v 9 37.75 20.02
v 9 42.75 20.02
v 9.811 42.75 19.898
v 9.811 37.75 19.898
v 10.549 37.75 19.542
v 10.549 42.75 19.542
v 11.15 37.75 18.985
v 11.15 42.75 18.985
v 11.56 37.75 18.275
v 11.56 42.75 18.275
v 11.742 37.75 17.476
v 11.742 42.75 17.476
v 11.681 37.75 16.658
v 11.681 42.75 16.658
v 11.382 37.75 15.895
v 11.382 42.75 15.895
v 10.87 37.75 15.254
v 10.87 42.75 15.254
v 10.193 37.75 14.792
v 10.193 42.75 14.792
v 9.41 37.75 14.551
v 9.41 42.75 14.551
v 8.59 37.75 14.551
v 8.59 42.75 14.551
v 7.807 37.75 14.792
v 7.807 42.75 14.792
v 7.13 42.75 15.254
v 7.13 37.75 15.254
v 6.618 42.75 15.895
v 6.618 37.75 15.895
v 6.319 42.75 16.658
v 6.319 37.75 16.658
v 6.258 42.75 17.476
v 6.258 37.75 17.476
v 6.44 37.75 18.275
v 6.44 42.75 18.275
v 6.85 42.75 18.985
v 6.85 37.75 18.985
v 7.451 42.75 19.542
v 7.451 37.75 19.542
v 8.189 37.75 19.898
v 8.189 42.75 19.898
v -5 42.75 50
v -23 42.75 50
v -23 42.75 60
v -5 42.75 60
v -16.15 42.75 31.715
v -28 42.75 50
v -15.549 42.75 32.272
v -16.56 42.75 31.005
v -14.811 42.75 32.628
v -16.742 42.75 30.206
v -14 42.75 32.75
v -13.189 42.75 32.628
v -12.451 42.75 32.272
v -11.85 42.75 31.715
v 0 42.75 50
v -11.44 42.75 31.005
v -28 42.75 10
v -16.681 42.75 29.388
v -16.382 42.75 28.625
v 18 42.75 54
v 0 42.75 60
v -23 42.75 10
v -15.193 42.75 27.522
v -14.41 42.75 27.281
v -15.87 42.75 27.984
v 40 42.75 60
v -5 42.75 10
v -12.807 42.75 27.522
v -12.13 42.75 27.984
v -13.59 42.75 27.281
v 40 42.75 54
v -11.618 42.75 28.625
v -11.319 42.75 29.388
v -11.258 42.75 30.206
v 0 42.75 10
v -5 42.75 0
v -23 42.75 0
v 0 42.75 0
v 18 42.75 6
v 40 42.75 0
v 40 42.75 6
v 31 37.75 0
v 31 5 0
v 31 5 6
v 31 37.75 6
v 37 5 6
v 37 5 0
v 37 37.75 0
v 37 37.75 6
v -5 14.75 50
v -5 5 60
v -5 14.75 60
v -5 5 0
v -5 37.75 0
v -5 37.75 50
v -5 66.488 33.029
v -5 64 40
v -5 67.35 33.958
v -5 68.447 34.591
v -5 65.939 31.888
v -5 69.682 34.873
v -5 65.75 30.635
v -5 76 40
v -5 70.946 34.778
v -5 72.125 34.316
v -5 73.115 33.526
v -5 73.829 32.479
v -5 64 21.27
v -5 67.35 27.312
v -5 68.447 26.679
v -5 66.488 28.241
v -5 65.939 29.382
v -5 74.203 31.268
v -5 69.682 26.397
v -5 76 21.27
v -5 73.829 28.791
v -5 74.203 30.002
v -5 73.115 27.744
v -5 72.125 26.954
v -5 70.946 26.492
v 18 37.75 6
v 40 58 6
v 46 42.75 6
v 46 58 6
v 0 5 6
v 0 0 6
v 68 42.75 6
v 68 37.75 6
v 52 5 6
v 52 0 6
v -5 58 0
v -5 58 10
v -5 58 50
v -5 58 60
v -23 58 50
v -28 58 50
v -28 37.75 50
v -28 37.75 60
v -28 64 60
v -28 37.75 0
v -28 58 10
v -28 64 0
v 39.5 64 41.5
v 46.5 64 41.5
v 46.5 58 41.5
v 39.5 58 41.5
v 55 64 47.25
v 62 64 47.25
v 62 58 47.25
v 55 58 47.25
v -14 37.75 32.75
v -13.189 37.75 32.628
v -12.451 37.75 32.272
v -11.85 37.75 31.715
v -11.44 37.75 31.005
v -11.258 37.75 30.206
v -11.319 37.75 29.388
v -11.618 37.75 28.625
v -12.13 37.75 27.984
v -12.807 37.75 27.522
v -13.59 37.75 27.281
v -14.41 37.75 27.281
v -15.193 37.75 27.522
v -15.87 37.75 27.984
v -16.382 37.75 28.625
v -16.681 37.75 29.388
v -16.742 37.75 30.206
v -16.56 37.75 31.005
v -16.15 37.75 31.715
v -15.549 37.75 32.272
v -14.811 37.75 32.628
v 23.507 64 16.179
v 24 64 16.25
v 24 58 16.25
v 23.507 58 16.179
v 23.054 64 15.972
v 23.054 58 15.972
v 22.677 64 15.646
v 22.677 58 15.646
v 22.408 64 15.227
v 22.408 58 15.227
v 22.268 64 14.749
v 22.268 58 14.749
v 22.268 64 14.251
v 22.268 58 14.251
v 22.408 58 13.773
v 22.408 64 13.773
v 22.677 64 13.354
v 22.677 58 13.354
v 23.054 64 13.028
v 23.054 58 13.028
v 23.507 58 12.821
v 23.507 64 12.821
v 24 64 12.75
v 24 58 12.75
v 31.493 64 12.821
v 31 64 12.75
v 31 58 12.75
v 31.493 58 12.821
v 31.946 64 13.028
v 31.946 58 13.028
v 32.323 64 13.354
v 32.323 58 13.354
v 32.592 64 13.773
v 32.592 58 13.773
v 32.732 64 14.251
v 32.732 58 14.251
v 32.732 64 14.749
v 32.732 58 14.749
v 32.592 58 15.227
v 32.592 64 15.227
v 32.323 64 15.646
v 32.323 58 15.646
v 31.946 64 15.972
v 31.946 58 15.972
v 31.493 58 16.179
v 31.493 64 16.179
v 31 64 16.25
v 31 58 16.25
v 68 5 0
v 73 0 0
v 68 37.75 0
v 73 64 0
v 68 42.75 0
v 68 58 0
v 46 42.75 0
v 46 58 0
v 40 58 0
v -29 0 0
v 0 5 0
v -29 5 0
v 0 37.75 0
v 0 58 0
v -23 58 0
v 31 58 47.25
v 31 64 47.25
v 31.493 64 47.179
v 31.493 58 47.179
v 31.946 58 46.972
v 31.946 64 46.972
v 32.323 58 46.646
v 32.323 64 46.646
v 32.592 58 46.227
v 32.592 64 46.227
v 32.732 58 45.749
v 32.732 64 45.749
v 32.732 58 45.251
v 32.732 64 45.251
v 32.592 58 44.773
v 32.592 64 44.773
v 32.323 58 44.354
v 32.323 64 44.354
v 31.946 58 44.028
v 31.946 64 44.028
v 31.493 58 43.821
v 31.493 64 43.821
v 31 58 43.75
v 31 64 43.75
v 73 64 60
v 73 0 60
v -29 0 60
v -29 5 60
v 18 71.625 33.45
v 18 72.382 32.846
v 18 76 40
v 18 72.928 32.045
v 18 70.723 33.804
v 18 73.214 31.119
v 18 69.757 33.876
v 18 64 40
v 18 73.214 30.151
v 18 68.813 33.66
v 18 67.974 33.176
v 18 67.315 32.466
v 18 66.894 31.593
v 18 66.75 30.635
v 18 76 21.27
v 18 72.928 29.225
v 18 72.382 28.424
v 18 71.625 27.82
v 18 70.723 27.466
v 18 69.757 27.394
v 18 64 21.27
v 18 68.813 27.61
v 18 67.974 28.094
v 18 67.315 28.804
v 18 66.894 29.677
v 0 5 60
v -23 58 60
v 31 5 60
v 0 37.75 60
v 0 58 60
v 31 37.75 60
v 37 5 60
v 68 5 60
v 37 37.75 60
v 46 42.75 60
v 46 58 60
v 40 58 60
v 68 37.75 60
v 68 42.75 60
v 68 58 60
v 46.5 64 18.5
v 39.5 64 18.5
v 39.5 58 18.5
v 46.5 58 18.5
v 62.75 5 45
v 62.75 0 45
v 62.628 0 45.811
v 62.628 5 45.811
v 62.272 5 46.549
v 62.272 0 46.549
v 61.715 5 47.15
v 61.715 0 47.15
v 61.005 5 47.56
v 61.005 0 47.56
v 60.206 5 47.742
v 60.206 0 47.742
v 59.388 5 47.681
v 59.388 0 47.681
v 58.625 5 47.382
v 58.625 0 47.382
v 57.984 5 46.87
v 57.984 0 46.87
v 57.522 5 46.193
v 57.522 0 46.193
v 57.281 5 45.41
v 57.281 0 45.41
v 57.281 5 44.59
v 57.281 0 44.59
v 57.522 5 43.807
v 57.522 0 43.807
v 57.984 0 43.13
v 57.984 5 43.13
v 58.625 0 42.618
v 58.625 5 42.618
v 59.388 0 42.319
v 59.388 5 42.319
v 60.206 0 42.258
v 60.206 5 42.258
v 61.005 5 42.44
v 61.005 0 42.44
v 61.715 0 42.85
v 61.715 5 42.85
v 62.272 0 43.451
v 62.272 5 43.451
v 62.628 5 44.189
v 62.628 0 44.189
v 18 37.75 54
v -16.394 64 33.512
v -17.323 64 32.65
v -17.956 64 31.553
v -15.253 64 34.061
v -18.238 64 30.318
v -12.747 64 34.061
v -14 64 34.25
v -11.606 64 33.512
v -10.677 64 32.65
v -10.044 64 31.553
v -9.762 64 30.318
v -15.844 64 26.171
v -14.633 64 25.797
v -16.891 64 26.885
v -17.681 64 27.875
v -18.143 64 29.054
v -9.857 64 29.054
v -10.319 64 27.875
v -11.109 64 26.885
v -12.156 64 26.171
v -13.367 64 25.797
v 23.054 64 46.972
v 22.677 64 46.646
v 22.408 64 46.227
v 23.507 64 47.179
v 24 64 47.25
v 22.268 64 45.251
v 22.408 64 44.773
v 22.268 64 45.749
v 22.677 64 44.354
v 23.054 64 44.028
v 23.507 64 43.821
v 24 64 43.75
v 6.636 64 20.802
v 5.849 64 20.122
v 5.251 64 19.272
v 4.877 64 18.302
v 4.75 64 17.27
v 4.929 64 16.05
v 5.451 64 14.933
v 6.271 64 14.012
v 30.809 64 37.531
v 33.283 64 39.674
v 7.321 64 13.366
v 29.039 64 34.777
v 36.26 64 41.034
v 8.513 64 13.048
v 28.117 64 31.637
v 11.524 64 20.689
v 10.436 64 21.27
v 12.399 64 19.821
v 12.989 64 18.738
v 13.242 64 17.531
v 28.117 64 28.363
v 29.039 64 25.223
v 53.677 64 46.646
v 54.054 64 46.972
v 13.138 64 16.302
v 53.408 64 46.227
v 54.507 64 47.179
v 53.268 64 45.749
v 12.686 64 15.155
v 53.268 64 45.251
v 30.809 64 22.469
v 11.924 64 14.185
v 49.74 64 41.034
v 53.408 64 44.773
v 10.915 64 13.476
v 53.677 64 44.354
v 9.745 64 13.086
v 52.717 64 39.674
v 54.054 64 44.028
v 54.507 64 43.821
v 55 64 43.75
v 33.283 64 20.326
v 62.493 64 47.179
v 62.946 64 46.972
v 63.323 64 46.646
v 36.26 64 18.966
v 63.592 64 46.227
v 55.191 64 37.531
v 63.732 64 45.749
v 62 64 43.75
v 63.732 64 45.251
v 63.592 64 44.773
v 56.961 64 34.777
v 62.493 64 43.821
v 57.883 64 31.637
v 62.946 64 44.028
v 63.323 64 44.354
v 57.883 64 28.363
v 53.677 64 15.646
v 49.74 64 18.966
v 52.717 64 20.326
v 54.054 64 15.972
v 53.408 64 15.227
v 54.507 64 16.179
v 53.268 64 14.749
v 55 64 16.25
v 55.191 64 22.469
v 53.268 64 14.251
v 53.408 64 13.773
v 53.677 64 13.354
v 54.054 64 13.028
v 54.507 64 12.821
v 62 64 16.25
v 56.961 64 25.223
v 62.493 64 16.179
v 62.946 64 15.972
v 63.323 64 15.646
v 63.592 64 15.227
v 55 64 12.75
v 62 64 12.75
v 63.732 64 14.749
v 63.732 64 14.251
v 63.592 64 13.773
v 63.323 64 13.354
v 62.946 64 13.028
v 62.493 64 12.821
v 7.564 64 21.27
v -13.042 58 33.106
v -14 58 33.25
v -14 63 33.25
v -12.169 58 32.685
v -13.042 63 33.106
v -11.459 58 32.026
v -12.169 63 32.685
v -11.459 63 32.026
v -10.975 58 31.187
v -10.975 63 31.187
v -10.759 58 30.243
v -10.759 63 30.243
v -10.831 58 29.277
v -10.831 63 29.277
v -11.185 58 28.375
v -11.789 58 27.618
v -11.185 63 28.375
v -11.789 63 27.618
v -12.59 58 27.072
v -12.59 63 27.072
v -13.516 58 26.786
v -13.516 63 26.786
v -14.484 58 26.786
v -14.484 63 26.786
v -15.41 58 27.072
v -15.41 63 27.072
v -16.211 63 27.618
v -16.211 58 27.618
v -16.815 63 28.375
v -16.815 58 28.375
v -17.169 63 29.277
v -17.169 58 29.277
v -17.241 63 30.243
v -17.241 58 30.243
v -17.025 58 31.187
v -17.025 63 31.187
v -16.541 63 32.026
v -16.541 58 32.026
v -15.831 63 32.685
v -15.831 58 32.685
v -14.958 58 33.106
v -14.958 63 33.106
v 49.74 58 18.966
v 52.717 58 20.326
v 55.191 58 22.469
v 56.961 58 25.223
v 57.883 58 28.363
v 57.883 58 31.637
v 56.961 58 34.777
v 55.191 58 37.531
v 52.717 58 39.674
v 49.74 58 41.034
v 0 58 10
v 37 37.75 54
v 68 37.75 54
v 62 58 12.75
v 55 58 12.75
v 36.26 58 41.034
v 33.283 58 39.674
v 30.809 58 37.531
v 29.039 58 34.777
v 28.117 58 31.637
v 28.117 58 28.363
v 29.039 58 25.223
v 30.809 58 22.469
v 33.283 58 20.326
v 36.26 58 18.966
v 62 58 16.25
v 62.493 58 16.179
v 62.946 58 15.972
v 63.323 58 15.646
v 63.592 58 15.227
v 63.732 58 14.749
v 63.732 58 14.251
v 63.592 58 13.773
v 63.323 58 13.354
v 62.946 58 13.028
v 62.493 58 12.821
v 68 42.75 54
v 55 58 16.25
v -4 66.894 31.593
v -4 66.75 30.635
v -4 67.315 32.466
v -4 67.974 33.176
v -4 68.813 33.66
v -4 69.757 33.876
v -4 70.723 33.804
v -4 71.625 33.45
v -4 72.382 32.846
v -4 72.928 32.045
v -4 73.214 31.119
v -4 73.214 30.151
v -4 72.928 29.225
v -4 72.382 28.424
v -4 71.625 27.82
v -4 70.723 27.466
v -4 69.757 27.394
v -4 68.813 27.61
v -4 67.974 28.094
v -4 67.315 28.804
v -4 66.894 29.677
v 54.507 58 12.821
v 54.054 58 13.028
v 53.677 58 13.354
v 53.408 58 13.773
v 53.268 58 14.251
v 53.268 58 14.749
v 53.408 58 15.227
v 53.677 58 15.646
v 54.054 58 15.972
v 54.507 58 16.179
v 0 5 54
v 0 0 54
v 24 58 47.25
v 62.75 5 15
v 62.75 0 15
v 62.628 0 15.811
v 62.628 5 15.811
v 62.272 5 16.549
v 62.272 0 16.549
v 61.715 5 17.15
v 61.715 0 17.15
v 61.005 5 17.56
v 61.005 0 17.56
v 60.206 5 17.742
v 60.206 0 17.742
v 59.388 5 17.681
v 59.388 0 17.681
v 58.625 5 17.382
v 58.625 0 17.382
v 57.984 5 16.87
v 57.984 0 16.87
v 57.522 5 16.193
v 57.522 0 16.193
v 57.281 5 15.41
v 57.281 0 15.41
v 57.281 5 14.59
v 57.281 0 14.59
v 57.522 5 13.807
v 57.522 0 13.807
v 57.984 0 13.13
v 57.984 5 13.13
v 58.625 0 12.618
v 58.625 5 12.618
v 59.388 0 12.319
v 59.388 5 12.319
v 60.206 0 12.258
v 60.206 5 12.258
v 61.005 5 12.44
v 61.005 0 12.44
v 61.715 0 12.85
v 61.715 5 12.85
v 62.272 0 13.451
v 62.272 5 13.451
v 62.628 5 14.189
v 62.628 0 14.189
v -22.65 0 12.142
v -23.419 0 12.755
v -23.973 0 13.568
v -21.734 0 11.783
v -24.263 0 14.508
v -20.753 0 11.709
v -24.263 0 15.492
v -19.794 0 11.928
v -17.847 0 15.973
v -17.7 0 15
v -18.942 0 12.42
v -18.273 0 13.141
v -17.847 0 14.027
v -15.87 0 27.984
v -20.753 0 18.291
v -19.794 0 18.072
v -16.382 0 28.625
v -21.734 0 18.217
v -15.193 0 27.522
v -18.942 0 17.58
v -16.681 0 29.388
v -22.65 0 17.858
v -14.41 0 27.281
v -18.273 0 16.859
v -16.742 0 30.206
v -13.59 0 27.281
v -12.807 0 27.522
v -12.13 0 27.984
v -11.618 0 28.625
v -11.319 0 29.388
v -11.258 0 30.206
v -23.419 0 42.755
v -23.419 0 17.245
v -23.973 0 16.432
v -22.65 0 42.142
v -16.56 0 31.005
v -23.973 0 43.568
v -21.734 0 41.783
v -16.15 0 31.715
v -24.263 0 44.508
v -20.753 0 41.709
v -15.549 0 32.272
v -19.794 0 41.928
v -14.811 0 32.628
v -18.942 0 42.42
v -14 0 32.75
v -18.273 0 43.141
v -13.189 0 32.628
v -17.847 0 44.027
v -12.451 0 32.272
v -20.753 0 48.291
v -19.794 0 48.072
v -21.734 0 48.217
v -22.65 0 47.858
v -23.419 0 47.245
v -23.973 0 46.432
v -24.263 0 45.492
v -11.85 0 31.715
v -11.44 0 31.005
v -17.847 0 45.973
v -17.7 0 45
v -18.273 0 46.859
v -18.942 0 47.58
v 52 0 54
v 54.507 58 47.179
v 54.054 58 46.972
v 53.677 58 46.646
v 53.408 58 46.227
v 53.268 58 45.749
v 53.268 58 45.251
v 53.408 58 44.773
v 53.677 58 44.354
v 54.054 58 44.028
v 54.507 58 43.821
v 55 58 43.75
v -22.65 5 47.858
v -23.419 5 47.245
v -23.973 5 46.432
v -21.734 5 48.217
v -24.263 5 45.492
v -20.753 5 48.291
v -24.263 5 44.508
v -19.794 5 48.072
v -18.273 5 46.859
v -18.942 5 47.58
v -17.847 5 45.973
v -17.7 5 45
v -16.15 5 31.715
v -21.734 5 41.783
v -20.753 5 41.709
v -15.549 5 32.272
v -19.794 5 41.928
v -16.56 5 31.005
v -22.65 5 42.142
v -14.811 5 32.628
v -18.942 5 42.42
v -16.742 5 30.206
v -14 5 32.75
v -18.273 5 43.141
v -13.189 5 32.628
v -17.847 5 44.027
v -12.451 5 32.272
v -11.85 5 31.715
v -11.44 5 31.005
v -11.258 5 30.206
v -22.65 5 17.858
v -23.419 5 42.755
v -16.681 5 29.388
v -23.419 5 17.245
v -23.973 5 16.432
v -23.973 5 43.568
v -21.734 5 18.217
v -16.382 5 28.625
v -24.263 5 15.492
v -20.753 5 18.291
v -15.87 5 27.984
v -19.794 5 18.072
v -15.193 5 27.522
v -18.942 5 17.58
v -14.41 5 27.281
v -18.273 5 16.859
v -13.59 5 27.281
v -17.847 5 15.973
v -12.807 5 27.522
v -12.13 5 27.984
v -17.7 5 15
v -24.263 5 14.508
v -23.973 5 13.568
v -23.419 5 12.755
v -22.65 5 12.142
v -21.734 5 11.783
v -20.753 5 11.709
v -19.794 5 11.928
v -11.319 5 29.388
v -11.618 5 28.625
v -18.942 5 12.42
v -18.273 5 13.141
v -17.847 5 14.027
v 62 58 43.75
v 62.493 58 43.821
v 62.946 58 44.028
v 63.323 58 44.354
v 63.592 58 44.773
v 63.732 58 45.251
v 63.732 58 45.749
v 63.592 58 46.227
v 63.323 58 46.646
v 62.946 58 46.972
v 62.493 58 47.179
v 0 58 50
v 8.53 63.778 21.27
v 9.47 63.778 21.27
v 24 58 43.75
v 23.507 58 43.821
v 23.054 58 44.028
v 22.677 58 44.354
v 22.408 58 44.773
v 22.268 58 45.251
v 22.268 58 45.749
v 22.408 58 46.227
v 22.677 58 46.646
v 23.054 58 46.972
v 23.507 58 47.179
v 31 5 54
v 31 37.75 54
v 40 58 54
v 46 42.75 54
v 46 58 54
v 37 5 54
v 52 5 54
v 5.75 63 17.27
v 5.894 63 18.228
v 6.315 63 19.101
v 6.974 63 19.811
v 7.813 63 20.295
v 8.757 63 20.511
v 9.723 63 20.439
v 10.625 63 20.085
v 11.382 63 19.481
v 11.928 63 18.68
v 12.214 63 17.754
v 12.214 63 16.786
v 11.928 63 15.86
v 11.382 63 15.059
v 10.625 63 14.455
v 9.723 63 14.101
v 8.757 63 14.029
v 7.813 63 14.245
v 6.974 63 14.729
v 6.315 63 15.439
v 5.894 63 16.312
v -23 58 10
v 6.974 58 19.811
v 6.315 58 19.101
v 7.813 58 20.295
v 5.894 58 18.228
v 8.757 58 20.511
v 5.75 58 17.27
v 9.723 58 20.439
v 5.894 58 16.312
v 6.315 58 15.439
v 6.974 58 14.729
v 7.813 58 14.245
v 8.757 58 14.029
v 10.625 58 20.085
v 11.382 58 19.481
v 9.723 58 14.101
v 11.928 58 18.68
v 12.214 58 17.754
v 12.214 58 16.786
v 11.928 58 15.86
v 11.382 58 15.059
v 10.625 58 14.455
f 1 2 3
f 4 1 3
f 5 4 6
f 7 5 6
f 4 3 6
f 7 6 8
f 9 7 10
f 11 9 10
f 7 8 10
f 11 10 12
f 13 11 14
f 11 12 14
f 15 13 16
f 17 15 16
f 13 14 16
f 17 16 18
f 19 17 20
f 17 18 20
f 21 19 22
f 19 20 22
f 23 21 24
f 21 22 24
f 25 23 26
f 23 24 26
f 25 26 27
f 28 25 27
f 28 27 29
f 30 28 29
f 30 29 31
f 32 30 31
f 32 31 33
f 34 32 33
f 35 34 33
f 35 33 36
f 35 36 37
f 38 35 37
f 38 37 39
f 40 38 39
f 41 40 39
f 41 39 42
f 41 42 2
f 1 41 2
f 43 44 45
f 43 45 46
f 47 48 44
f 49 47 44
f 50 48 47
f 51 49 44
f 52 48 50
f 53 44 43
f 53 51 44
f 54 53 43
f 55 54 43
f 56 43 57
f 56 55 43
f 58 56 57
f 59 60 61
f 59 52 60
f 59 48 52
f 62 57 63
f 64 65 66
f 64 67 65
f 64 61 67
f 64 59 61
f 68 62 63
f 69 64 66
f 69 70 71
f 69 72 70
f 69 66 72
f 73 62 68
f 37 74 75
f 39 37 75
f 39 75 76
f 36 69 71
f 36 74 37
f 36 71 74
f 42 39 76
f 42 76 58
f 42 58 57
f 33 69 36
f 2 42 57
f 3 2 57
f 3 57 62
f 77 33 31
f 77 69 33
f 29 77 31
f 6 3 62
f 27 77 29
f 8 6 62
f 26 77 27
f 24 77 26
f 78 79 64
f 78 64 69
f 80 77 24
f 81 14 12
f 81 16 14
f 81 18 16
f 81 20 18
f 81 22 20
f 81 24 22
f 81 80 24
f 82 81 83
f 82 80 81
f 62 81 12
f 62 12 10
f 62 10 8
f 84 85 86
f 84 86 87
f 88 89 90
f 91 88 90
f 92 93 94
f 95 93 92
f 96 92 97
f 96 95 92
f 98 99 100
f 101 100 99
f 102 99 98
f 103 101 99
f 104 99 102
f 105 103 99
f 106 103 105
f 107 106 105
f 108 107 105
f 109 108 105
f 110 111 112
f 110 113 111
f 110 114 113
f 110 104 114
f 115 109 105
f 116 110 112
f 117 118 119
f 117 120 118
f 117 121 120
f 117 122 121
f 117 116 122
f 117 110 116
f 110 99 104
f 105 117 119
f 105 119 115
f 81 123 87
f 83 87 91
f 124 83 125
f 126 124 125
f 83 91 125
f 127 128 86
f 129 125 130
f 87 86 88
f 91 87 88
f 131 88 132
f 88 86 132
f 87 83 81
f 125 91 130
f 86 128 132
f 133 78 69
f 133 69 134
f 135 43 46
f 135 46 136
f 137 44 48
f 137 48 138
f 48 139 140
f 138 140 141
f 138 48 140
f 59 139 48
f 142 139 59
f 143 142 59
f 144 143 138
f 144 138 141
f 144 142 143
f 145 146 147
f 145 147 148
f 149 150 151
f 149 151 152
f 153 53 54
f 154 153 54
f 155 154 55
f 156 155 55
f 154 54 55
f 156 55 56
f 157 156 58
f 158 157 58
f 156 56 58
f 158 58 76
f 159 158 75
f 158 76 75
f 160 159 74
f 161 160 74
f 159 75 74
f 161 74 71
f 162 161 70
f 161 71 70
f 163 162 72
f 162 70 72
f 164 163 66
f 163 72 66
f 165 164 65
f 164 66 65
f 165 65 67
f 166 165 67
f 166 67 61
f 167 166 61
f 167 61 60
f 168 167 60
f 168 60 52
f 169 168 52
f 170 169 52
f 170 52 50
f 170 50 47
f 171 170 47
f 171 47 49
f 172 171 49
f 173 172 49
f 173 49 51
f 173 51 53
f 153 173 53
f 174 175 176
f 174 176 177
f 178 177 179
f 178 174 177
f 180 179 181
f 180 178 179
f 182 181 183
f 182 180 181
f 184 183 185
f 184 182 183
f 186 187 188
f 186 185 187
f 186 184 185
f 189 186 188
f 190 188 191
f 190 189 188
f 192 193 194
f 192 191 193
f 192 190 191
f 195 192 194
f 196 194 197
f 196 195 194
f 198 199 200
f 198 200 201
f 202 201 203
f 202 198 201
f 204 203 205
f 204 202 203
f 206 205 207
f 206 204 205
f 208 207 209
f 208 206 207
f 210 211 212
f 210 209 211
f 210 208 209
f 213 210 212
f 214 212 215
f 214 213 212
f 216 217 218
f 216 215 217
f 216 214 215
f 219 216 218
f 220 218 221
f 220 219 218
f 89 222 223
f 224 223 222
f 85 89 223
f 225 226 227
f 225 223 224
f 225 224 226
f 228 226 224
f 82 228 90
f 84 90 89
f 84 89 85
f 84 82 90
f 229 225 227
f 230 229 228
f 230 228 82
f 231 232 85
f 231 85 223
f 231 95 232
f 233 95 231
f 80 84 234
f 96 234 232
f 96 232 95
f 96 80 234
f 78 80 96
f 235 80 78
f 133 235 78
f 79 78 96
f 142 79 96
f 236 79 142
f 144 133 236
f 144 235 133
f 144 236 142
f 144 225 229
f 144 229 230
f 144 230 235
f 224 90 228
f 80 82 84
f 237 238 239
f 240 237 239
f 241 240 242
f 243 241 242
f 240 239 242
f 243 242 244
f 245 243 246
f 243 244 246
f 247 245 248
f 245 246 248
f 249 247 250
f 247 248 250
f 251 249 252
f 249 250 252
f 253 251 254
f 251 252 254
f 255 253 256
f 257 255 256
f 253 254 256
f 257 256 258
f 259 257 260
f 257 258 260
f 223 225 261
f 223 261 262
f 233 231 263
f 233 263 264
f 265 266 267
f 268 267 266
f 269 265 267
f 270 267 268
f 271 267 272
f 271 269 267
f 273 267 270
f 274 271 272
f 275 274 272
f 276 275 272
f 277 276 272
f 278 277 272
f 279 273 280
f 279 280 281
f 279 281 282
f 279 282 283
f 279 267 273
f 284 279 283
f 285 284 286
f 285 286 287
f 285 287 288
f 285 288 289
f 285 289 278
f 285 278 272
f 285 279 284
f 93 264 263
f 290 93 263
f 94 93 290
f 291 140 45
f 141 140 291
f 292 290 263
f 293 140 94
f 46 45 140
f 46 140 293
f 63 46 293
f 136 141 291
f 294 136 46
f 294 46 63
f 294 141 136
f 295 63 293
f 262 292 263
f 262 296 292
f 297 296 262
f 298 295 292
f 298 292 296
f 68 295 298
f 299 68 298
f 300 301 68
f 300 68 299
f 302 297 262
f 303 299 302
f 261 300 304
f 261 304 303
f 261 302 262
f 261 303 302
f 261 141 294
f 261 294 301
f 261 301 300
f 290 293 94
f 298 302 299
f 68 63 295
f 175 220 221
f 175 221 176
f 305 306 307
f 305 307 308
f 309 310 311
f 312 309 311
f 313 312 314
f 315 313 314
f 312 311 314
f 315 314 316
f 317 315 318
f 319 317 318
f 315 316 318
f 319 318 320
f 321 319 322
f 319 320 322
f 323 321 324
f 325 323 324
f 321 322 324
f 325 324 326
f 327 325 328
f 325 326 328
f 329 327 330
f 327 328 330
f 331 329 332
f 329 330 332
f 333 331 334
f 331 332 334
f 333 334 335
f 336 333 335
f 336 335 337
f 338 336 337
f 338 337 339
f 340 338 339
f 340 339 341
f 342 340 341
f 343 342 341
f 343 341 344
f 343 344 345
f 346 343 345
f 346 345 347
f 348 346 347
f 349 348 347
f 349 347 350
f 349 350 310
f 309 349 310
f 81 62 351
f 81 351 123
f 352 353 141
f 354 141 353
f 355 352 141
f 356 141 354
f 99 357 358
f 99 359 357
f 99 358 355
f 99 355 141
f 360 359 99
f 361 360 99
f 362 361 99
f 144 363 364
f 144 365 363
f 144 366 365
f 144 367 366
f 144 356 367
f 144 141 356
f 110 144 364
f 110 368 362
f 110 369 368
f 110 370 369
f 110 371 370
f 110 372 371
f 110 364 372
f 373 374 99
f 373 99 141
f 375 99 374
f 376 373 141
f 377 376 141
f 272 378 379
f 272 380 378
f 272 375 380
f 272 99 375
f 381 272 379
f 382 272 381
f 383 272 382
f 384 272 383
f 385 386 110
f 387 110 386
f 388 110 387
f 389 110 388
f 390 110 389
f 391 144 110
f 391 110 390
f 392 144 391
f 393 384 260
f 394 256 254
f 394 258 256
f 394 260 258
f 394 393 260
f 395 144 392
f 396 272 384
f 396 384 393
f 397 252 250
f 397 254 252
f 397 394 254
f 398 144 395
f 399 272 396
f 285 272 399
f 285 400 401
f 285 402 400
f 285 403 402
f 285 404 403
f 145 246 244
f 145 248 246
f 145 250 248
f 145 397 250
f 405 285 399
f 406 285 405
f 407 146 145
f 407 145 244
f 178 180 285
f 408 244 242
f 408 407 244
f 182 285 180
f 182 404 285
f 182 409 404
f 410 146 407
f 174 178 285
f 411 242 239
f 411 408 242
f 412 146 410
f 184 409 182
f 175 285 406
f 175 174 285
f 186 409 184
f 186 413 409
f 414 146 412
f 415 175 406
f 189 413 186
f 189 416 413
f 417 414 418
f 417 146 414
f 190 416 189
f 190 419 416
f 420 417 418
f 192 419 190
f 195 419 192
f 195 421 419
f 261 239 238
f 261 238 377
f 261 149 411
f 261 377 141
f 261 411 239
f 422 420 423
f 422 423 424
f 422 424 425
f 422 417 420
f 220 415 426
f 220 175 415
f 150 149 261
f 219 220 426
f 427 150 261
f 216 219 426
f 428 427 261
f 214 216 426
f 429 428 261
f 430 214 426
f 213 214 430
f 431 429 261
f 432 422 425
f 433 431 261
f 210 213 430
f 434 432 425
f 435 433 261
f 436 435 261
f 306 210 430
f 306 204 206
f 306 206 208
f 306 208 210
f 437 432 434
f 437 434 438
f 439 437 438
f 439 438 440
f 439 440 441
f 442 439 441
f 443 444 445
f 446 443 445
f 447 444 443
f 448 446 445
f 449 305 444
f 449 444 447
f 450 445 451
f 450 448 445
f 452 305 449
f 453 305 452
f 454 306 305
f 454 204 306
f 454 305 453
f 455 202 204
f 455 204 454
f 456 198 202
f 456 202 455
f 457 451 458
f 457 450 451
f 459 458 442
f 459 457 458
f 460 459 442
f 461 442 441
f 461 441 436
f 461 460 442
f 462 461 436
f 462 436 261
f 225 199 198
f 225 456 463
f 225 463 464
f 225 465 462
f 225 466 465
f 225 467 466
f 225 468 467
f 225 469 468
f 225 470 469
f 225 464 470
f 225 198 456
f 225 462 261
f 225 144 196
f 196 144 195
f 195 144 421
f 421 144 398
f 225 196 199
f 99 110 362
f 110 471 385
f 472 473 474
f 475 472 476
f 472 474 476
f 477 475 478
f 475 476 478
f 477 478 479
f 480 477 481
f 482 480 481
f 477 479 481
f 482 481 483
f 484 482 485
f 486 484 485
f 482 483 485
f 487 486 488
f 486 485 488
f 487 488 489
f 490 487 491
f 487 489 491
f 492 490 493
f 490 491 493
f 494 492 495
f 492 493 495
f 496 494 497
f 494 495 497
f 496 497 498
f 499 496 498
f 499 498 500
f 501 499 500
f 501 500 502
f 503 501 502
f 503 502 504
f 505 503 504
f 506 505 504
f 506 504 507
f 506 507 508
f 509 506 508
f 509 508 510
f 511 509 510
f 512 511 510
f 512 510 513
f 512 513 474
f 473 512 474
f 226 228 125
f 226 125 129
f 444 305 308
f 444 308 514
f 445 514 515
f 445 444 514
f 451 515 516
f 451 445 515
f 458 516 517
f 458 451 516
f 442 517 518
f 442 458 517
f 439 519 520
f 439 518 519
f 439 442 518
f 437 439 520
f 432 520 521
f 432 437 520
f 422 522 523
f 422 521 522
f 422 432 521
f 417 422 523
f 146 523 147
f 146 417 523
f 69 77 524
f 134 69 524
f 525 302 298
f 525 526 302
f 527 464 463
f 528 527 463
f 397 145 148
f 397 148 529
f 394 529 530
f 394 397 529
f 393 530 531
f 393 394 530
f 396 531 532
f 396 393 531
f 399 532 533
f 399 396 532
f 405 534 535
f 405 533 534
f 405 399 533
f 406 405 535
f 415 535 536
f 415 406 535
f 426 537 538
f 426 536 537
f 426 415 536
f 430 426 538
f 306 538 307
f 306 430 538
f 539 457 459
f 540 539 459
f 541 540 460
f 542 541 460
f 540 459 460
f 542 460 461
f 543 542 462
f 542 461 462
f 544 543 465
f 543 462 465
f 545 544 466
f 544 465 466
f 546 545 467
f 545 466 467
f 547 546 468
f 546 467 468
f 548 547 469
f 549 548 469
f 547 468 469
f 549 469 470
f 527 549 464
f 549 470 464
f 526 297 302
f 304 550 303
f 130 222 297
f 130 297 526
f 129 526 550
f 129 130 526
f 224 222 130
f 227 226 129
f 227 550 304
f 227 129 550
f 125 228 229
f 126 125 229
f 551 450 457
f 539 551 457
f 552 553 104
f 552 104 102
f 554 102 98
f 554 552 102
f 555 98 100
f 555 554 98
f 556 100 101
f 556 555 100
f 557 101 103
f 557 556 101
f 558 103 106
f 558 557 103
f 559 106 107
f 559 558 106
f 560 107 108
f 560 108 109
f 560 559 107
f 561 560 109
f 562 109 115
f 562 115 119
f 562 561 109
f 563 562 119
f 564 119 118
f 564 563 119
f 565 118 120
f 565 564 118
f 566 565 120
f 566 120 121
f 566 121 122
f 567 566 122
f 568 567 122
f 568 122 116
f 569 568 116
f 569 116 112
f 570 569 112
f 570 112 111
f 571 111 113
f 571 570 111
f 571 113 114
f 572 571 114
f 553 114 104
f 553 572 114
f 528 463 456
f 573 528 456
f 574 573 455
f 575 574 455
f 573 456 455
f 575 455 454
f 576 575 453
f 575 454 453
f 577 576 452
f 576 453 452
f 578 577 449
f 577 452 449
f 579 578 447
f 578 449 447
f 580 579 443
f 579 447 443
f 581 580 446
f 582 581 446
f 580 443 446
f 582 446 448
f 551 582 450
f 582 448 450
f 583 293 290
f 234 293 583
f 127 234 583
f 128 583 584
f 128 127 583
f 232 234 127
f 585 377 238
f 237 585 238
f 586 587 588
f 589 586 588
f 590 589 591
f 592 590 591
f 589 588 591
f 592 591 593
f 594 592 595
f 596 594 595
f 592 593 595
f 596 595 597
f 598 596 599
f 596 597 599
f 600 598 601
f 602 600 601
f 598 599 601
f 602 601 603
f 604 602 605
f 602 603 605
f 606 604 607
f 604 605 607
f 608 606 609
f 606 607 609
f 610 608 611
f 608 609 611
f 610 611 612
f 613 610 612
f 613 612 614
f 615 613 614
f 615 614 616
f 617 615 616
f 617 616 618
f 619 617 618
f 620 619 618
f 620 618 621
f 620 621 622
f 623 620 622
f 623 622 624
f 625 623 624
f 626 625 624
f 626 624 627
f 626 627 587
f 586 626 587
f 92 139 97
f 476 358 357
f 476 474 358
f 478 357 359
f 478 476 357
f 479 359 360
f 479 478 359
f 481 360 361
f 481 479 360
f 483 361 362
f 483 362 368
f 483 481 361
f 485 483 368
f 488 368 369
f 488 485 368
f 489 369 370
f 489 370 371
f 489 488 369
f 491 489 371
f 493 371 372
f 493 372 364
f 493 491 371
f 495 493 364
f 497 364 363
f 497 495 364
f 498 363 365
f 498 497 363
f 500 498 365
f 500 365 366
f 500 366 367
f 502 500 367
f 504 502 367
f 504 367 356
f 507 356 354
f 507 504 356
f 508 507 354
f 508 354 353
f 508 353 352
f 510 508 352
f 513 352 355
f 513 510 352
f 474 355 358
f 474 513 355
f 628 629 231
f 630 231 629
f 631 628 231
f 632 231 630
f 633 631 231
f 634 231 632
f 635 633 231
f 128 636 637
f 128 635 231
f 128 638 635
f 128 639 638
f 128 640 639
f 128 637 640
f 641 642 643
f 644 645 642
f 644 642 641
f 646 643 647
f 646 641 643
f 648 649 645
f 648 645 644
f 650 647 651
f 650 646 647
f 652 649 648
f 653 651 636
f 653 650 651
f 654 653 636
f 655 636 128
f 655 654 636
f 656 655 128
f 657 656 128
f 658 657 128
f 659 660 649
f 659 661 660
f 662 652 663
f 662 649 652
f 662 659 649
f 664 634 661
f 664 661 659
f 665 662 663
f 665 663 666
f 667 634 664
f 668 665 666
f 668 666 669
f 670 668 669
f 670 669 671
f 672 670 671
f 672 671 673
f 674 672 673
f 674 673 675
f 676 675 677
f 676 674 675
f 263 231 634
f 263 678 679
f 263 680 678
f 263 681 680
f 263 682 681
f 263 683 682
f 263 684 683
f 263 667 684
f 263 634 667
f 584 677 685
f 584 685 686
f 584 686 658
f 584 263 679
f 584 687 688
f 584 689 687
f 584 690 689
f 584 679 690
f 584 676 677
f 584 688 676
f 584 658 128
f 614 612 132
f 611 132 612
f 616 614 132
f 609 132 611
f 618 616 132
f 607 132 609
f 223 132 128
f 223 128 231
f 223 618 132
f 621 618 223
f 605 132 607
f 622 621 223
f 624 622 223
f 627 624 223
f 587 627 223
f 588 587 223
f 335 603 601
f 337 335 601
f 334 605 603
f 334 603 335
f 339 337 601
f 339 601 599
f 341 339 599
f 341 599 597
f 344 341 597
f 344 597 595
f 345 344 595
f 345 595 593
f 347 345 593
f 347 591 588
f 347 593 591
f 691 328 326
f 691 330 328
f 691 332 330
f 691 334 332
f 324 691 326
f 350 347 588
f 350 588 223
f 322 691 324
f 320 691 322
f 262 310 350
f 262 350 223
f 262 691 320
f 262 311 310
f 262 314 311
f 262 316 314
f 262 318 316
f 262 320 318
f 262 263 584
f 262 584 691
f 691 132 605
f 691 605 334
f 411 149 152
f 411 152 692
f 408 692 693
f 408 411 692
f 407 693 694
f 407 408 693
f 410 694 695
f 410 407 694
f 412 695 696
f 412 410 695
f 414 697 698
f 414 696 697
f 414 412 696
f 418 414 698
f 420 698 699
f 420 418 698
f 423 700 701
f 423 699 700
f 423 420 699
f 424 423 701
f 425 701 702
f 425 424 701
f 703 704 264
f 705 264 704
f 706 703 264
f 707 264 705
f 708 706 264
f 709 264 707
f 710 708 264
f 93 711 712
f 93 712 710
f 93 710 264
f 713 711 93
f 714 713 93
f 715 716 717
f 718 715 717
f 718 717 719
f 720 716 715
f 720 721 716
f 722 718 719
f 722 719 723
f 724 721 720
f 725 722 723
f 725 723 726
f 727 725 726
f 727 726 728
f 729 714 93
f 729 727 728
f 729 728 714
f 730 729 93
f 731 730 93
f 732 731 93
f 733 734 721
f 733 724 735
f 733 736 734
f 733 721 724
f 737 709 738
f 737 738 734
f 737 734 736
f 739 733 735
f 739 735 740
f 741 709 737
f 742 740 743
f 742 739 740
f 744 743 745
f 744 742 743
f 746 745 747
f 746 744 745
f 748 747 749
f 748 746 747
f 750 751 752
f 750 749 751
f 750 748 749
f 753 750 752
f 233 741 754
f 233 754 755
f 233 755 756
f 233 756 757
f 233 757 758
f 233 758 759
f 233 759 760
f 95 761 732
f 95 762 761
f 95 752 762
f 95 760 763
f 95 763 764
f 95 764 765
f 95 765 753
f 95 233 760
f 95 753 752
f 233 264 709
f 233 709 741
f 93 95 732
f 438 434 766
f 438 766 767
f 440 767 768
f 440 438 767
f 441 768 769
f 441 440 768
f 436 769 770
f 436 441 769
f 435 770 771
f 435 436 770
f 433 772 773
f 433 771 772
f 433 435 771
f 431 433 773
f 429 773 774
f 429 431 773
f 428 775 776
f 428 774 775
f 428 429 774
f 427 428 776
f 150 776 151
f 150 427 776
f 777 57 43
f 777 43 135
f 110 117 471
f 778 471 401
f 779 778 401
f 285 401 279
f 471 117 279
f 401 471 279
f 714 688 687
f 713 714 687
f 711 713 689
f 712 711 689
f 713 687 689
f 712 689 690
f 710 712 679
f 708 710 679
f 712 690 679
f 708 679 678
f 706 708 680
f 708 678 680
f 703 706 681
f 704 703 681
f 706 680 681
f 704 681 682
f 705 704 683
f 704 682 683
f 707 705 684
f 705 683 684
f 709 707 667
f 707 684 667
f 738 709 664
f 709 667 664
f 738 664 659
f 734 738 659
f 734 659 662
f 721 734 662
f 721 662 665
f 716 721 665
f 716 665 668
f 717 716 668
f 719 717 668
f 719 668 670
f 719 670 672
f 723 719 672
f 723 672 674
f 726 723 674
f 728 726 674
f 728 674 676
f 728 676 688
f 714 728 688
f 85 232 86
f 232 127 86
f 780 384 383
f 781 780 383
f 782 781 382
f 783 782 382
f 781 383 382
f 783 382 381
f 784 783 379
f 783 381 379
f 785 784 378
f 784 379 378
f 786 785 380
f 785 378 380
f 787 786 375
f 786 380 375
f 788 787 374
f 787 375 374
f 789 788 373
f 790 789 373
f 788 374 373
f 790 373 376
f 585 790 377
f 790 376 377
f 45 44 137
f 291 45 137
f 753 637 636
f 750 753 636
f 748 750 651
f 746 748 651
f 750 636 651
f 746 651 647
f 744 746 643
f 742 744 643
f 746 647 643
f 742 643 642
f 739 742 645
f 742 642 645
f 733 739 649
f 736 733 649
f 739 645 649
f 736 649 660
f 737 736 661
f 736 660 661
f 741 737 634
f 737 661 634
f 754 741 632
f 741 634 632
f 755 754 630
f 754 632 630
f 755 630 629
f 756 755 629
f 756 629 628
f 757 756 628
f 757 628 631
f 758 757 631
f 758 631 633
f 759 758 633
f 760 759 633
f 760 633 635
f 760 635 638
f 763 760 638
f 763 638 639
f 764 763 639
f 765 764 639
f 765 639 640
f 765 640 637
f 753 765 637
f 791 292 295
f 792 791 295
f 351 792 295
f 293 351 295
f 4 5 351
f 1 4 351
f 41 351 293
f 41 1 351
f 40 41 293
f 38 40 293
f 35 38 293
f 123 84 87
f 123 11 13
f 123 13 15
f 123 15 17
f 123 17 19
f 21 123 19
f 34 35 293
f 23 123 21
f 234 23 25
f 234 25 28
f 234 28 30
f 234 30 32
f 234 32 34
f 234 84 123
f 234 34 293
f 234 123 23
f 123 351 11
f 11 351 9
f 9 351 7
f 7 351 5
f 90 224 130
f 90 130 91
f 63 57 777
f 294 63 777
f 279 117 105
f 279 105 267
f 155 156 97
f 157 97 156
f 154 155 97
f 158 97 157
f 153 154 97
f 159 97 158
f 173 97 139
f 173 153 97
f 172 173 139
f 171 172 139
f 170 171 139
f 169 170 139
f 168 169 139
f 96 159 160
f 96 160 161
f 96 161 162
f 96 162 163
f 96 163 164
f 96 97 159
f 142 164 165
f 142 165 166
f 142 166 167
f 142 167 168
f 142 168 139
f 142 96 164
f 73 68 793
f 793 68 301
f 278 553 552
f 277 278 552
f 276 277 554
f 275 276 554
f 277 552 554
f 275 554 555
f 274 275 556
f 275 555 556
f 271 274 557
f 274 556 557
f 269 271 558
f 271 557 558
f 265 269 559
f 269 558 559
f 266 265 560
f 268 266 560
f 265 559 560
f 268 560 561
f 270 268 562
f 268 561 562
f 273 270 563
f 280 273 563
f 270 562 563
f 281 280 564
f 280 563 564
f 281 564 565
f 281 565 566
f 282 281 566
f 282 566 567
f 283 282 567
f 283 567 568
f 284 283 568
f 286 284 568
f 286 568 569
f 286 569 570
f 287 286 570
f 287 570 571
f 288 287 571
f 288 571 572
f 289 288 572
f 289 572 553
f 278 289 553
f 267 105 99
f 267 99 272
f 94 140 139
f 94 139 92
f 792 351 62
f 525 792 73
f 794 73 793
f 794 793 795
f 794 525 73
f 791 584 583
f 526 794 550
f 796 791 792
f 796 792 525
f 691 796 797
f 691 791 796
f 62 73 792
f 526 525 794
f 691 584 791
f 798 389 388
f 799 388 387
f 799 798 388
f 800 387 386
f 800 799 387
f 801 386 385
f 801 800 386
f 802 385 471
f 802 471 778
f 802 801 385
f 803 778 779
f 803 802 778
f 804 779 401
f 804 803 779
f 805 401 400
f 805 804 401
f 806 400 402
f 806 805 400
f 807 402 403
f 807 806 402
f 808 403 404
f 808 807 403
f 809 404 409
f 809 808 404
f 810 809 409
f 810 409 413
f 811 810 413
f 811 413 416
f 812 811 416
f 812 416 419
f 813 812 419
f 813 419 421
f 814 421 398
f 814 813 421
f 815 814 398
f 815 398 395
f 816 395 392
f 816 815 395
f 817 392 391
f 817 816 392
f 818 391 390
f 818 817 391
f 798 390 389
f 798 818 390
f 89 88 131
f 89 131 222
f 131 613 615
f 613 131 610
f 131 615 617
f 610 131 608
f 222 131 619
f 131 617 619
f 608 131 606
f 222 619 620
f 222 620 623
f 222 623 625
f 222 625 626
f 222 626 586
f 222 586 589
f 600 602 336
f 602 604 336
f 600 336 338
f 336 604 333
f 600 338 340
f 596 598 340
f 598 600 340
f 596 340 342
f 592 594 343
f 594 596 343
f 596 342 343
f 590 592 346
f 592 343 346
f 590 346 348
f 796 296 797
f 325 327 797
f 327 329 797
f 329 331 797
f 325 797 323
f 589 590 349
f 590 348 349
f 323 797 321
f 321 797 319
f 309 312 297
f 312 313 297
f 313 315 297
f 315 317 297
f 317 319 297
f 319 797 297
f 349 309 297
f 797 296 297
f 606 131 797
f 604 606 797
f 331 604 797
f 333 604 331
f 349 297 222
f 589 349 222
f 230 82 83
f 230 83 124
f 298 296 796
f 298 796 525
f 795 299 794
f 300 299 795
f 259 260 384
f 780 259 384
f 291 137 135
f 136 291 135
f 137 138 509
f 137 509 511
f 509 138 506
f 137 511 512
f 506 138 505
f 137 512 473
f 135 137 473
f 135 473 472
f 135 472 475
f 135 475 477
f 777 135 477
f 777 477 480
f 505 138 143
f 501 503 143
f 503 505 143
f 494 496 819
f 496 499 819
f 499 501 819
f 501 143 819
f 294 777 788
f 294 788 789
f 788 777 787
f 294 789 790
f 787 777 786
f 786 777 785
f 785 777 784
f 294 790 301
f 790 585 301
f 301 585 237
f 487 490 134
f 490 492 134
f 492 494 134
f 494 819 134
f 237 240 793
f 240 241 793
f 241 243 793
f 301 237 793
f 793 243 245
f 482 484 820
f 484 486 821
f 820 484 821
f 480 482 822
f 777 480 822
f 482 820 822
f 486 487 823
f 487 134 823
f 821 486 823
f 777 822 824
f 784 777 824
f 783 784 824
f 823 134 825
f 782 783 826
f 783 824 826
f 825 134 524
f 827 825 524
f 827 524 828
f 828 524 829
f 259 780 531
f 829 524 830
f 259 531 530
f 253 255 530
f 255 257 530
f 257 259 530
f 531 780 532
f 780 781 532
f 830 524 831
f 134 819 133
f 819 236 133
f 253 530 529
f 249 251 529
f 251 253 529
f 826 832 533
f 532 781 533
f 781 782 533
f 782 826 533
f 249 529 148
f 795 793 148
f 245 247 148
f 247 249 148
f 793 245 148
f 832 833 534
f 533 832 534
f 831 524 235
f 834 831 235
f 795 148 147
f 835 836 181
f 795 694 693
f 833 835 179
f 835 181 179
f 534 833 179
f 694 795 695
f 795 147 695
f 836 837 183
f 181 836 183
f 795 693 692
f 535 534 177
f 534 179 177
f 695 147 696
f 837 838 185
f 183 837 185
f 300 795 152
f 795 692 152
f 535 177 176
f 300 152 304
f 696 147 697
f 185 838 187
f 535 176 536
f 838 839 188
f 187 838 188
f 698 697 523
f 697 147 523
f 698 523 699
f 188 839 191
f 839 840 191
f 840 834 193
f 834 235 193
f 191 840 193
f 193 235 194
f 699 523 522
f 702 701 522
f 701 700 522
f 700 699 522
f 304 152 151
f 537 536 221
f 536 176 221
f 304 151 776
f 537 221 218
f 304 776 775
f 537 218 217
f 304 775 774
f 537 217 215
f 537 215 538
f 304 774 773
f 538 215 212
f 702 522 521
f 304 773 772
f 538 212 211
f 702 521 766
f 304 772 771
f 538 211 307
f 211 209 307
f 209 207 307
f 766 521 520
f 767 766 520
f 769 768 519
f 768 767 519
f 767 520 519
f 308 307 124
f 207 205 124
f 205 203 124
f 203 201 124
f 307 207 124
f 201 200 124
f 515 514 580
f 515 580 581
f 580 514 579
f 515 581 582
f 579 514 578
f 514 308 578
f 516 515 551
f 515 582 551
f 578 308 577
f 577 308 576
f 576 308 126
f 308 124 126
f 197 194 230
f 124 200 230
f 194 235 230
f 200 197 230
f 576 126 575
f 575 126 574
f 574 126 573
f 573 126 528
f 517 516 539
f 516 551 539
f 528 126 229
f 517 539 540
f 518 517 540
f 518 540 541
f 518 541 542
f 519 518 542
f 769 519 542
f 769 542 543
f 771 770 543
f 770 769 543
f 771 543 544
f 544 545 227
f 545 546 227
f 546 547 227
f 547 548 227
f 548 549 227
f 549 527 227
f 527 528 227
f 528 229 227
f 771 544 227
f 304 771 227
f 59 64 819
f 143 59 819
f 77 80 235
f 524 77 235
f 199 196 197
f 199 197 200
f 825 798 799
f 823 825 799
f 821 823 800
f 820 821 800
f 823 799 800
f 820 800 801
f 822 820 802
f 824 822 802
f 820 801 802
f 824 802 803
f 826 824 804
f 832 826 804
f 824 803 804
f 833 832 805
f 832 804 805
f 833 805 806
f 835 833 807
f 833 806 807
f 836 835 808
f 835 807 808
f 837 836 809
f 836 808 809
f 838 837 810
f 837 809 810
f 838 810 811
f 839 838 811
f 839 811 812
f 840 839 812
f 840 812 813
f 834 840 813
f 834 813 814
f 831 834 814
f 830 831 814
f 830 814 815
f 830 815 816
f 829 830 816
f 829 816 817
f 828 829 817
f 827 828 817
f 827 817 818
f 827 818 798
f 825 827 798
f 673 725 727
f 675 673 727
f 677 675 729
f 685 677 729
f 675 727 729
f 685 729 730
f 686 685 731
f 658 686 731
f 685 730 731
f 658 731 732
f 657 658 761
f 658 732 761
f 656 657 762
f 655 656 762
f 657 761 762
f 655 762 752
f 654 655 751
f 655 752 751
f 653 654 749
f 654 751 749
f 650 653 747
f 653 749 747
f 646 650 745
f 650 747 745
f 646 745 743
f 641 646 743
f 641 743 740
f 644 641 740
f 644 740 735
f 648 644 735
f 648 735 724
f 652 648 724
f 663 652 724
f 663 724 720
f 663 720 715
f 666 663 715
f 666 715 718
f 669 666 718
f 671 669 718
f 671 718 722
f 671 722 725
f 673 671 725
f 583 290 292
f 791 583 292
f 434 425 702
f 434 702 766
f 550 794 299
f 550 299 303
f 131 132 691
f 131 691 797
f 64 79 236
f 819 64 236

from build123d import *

# Parameters (mm, degrees)
SKETCH1_W           = 68
SKETCH1_H           = 15.25
SKETCH1_W_2         = 18
BOSS_EXTRUDE1_DEPTH = 60
SKETCH2_W           = 40
SKETCH2_H           = 15.25
CUT_EXTRUDE1_DEPTH  = 122.264174429
CUT_EXTRUDE2_REACH  = 116.127
CUT_EXTRUDE3_REACH  = 123.264
SKETCH5_R           = 3.25
CUT_EXTRUDE4_REACH  = 105.714
SKETCH6_R           = 2.75
SKETCH7_R           = 2.75
CUT_EXTRUDE5_DEPTH  = 115.127122105
CUT_EXTRUDE6_REACH  = 116.127
SKETCH8_R           = 3.25
SKETCH9_W           = 23
SKETCH9_H           = 21.27
SKETCH9_H_2         = 20
CUT_EXTRUDE7_DEPTH  = 12
CHAMFER1_SIZE       = 1
CUT_EXTRUDE8_REACH  = 123.264
SKETCH10_R          = 3.3
SKETCH10_R_2        = 2.75
SKETCH11_R          = 3.25
CUT_EXTRUDE9_DEPTH  = 125.338248339
CHAMFER2_SIZE       = 1
SKETCH12_W          = 50
SKETCH12_H          = 48
CUT_EXTRUDE10_DEPTH = 5
SKETCH13_W          = 52
SKETCH13_H          = 6
BOSS_EXTRUDE2_DEPTH = 5
SKETCH14_W          = 6
SKETCH14_H          = 32.75
BOSS_EXTRUDE3_DEPTH = 6
SKETCH15_W          = 6
SKETCH15_H          = 15.25
BOSS_EXTRUDE4_DEPTH = 6
BOSS_EXTRUDE5_DEPTH = 10


with BuildPart() as part:
    # Sketch1 → Boss-Extrude1 (new body)
    with BuildSketch(Plane.XY):
        Polygon((0, 0), (-29, 0), (-29, 5), (-5, 5), (-5, 37.75), (-28, 37.75), (-28, 64), (-5, 64), (-5, 76), (18, 76), (18, 64), (73, 64), (73, 0), (52, 0), (52, 5), (68, 5), (68, 37.75), (0, 37.75), align=None)
        with Locations((34, 50.375)):
            Rectangle(SKETCH1_W, SKETCH1_H, mode=Mode.SUBTRACT)
        with Locations((-14, 50.375)):
            Rectangle(SKETCH1_W_2, SKETCH1_H, mode=Mode.SUBTRACT)
    extrude(amount=BOSS_EXTRUDE1_DEPTH)

    # Sketch2 → Cut-Extrude1 (cut, through all)
    with BuildSketch(Plane(origin=(0, 0, 0), x_dir=(0, 0, -1), z_dir=(1, 0, 0))):
        with Locations((-30, 50.375)):
            Rectangle(SKETCH2_W, SKETCH2_H)
    extrude(amount=-CUT_EXTRUDE1_DEPTH, mode=Mode.SUBTRACT)

    # Sketch3 → Cut-Extrude2 (cut, up to next)
    with BuildSketch(Plane(origin=(0, 64, 0), x_dir=(1, 0, 0), z_dir=(0, 1, 0)), mode=Mode.PRIVATE) as cut_extrude2_sk1:
        with BuildLine():
            Line((39.5, -18.5), (46.5, -18.5))
            ThreePointArc((46.5, -18.5), (58, -30), (46.5, -41.5))
            Line((46.5, -41.5), (39.5, -41.5))
            ThreePointArc((39.5, -41.5), (28, -30), (39.5, -18.5))
        make_face()
    cut_extrude2_tool1 = extrude(cut_extrude2_sk1.sketch, amount=-CUT_EXTRUDE2_REACH, mode=Mode.PRIVATE) & part.part
    # Sketch3 → Cut-Extrude2 (cut, up to next)
    with BuildSketch(Plane(origin=(0, 64, 0), x_dir=(1, 0, 0), z_dir=(0, 1, 0)), mode=Mode.PRIVATE) as cut_extrude2_sk2:
        with BuildLine():
            Line((31, -16.25), (24, -16.25))
            ThreePointArc((24, -16.25), (22.25, -14.5), (24, -12.75))
            Line((24, -12.75), (31, -12.75))
            ThreePointArc((31, -12.75), (32.75, -14.5), (31, -16.25))
        make_face()
    cut_extrude2_tool2 = extrude(cut_extrude2_sk2.sketch, amount=-CUT_EXTRUDE2_REACH, mode=Mode.PRIVATE) & part.part
    # Sketch3 → Cut-Extrude2 (cut, up to next)
    with BuildSketch(Plane(origin=(0, 64, 0), x_dir=(1, 0, 0), z_dir=(0, 1, 0)), mode=Mode.PRIVATE) as cut_extrude2_sk3:
        with BuildLine():
            Line((55, -16.25), (62, -16.25))
            ThreePointArc((62, -16.25), (63.75, -14.5), (62, -12.75))
            Line((62, -12.75), (55, -12.75))
            ThreePointArc((55, -12.75), (53.25, -14.5), (55, -16.25))
        make_face()
    cut_extrude2_tool3 = extrude(cut_extrude2_sk3.sketch, amount=-CUT_EXTRUDE2_REACH, mode=Mode.PRIVATE) & part.part
    # Sketch3 → Cut-Extrude2 (cut, up to next)
    with BuildSketch(Plane(origin=(0, 64, 0), x_dir=(1, 0, 0), z_dir=(0, 1, 0)), mode=Mode.PRIVATE) as cut_extrude2_sk4:
        with BuildLine():
            Line((31, -43.75), (24, -43.75))
            ThreePointArc((24, -43.75), (22.25, -45.5), (24, -47.25))
            Line((24, -47.25), (31, -47.25))
            ThreePointArc((31, -47.25), (32.75, -45.5), (31, -43.75))
        make_face()
    cut_extrude2_tool4 = extrude(cut_extrude2_sk4.sketch, amount=-CUT_EXTRUDE2_REACH, mode=Mode.PRIVATE) & part.part
    # Sketch3 → Cut-Extrude2 (cut, up to next)
    with BuildSketch(Plane(origin=(0, 64, 0), x_dir=(1, 0, 0), z_dir=(0, 1, 0)), mode=Mode.PRIVATE) as cut_extrude2_sk5:
        with BuildLine():
            Line((55, -43.75), (62, -43.75))
            ThreePointArc((62, -43.75), (63.75, -45.5), (62, -47.25))
            Line((62, -47.25), (55, -47.25))
            ThreePointArc((55, -47.25), (53.25, -45.5), (55, -43.75))
        make_face()
    cut_extrude2_tool5 = extrude(cut_extrude2_sk5.sketch, amount=-CUT_EXTRUDE2_REACH, mode=Mode.PRIVATE) & part.part
    add(cut_extrude2_tool1.solids().sort_by_distance((43, 64, 30))[0], mode=Mode.SUBTRACT)
    add(cut_extrude2_tool2.solids().sort_by_distance((27.5, 64, 14.5))[0], mode=Mode.SUBTRACT)
    add(cut_extrude2_tool3.solids().sort_by_distance((58.5, 64, 14.5))[0], mode=Mode.SUBTRACT)
    add(cut_extrude2_tool4.solids().sort_by_distance((27.5, 64, 45.5))[0], mode=Mode.SUBTRACT)
    add(cut_extrude2_tool5.solids().sort_by_distance((58.5, 64, 45.5))[0], mode=Mode.SUBTRACT)

    # Sketch5 → Cut-Extrude3 (cut, up to next)
    with BuildSketch(Plane(origin=(0, 76, 0), x_dir=(1, 0, 0), z_dir=(0, 1, 0)), mode=Mode.PRIVATE) as cut_extrude3_sk1:
        with Locations(Location((9, -17.27, 0), (0, 0, 180))):
            Circle(SKETCH5_R)
    cut_extrude3_tool1 = extrude(cut_extrude3_sk1.sketch, amount=-CUT_EXTRUDE3_REACH, mode=Mode.PRIVATE) & part.part
    add(cut_extrude3_tool1.solids().sort_by_distance((9, 76, 17.27))[0], mode=Mode.SUBTRACT)

    # Sketch6 → Cut-Extrude4 (cut, up to next)
    with BuildSketch(Plane(origin=(0, 42.75, 0), x_dir=(1, 0, 0), z_dir=(0, 1, 0)), mode=Mode.PRIVATE) as cut_extrude4_sk1:
        with Locations(Location((9, -17.27, 0), (0, 0, 270))):
            Circle(SKETCH6_R)
    cut_extrude4_tool1 = extrude(cut_extrude4_sk1.sketch, amount=-CUT_EXTRUDE4_REACH, mode=Mode.PRIVATE) & part.part
    add(cut_extrude4_tool1.solids().sort_by_distance((9, 42.75, 17.27))[0], mode=Mode.SUBTRACT)

    # Sketch7 → Cut-Extrude5 (cut, through all)
    with BuildSketch(Plane(origin=(0, 64, 0), x_dir=(1, 0, 0), z_dir=(0, 1, 0))):
        with Locations(Location((-14, -30, 0), (0, 0, 270))):
            Circle(SKETCH7_R)
    extrude(amount=-CUT_EXTRUDE5_DEPTH, mode=Mode.SUBTRACT)

    # Sketch8 → Cut-Extrude6 (cut, up to next)
    with BuildSketch(Plane(origin=(0, 64, 0), x_dir=(1, 0, 0), z_dir=(0, 1, 0)), mode=Mode.PRIVATE) as cut_extrude6_sk1:
        with Locations(Location((-14, -30, 0), (0, 0, 270))):
            Circle(SKETCH8_R)
    cut_extrude6_tool1 = extrude(cut_extrude6_sk1.sketch, amount=-CUT_EXTRUDE6_REACH, mode=Mode.PRIVATE) & part.part
    add(cut_extrude6_tool1.solids().sort_by_distance((-14, 64, 30))[0], mode=Mode.SUBTRACT)

    # Sketch9 → Cut-Extrude7 (cut)
    with BuildSketch(Plane(origin=(0, 76, 0), x_dir=(1, 0, 0), z_dir=(0, 1, 0))):
        with Locations((6.5, -10.635)):
            Rectangle(SKETCH9_W, SKETCH9_H)
        with Locations((6.5, -50)):
            Rectangle(SKETCH9_W, SKETCH9_H_2)
    extrude(amount=-CUT_EXTRUDE7_DEPTH, mode=Mode.SUBTRACT)

    # Chamfer1
    # the kernel refuses this chamfer: 1 mm, written as the material it takes off along each edge
    with BuildSketch(Plane(origin=(-14, 64, 30), x_dir=(0, 0, 1), z_dir=(-1, 0, 0))) as chamfer1_piece_1:
        Polygon((3.25 + CHAMFER1_SIZE, 0), (3.25, -CHAMFER1_SIZE), (3.25, 0), align=None)
    revolve(axis=Axis((-14, 64, 30), (0, 1, 0)), mode=Mode.SUBTRACT)
    with BuildSketch(Plane(origin=(9, 64, 17.27), x_dir=(-1, 0, 0), z_dir=(0, 0, -1))) as chamfer1_piece_2_section:
        Polygon((3.25 + CHAMFER1_SIZE, 0), (3.25, -CHAMFER1_SIZE), (3.25, 0), align=None)
    chamfer1_piece_2 = revolve(axis=Axis((9, 64, 17.27), (0, 1, 0)), mode=Mode.PRIVATE)
    chamfer1_piece_2 = split(chamfer1_piece_2, bisect_by=Plane(origin=(12.733674615, 63.516325385, 21.27), z_dir=(0, 0, -1)), keep=Keep.TOP, mode=Mode.PRIVATE)
    add(chamfer1_piece_2, mode=Mode.SUBTRACT)

    # Sketch10 → Cut-Extrude8 (cut, up to next)
    with BuildSketch(Plane.XZ, mode=Mode.PRIVATE) as cut_extrude8_sk1:
        with Locations((-21, 45)):
            Circle(SKETCH10_R)
    cut_extrude8_tool1 = extrude(cut_extrude8_sk1.sketch, amount=-CUT_EXTRUDE8_REACH, mode=Mode.PRIVATE) & part.part
    # Sketch10 → Cut-Extrude8 (cut, up to next)
    with BuildSketch(Plane.XZ, mode=Mode.PRIVATE) as cut_extrude8_sk2:
        with Locations((-21, 15)):
            Circle(SKETCH10_R)
    cut_extrude8_tool2 = extrude(cut_extrude8_sk2.sketch, amount=-CUT_EXTRUDE8_REACH, mode=Mode.PRIVATE) & part.part
    # Sketch10 → Cut-Extrude8 (cut, up to next)
    with BuildSketch(Plane.XZ, mode=Mode.PRIVATE) as cut_extrude8_sk3:
        with Locations((60, 15)):
            Circle(SKETCH10_R_2)
    cut_extrude8_tool3 = extrude(cut_extrude8_sk3.sketch, amount=-CUT_EXTRUDE8_REACH, mode=Mode.PRIVATE) & part.part
    # Sketch10 → Cut-Extrude8 (cut, up to next)
    with BuildSketch(Plane.XZ, mode=Mode.PRIVATE) as cut_extrude8_sk4:
        with Locations((60, 45)):
            Circle(SKETCH10_R_2)
    cut_extrude8_tool4 = extrude(cut_extrude8_sk4.sketch, amount=-CUT_EXTRUDE8_REACH, mode=Mode.PRIVATE) & part.part
    add(cut_extrude8_tool1.solids().sort_by_distance((-21, 0, 45))[0], mode=Mode.SUBTRACT)
    add(cut_extrude8_tool2.solids().sort_by_distance((-21, 0, 15))[0], mode=Mode.SUBTRACT)
    add(cut_extrude8_tool3.solids().sort_by_distance((60, 0, 15))[0], mode=Mode.SUBTRACT)
    add(cut_extrude8_tool4.solids().sort_by_distance((60, 0, 45))[0], mode=Mode.SUBTRACT)

    # Sketch11 → Cut-Extrude9 (cut, through all)
    with BuildSketch(Plane.ZY.offset(5)):
        with Locations(Location((30.635, 70, 0), (0, 0, 270))):
            Circle(SKETCH11_R)
    extrude(amount=-CUT_EXTRUDE9_DEPTH, mode=Mode.SUBTRACT)

    # Chamfer2
    chamfer2_edges = [part.edges().sort_by_distance(p)[0] for p in [
        (-5, 73.25, 30.635),
    ]]
    chamfer(chamfer2_edges, length=CHAMFER2_SIZE)

    # Sketch12 → Cut-Extrude10 (cut)
    with BuildSketch(Plane(origin=(0, 42.75, 0), x_dir=(1, 0, 0), z_dir=(0, 1, 0))):
        with Locations((43, -30)):
            Rectangle(SKETCH12_W, SKETCH12_H)
    extrude(amount=-CUT_EXTRUDE10_DEPTH, mode=Mode.SUBTRACT)

    # Sketch13 → Boss-Extrude2 (add)
    with BuildSketch(Plane.XZ):
        with Locations((26, 57)):
            Rectangle(SKETCH13_W, SKETCH13_H)
        with Locations((26, 3)):
            Rectangle(SKETCH13_W, SKETCH13_H)
    extrude(amount=-BOSS_EXTRUDE2_DEPTH)

    # Sketch14 → Boss-Extrude3 (add)
    with BuildSketch(Plane.XY.offset(60)):
        with Locations((34, 21.375)):
            Rectangle(SKETCH14_W, SKETCH14_H)
    boss_extrude3 = extrude(amount=-BOSS_EXTRUDE3_DEPTH)

    # Sketch15 → Boss-Extrude4 (add)
    with BuildSketch(Plane.XY.offset(60)):
        with Locations((43, 50.375)):
            Rectangle(SKETCH15_W, SKETCH15_H)
    boss_extrude4 = extrude(amount=-BOSS_EXTRUDE4_DEPTH)

    # Mirror1: Boss-Extrude3, Boss-Extrude4 across plane
    add(boss_extrude3.mirror(Plane.XY.offset(30)))
    add(boss_extrude4.mirror(Plane.XY.offset(30)))

    # Sketch16 → Boss-Extrude5 (add)
    with BuildSketch(Plane.XY.offset(60)):
        Polygon((-28, 37.75), (-5, 14.75), (-5, 37.75), align=None)
    extrude(amount=-BOSS_EXTRUDE5_DEPTH)


solid = part.part
